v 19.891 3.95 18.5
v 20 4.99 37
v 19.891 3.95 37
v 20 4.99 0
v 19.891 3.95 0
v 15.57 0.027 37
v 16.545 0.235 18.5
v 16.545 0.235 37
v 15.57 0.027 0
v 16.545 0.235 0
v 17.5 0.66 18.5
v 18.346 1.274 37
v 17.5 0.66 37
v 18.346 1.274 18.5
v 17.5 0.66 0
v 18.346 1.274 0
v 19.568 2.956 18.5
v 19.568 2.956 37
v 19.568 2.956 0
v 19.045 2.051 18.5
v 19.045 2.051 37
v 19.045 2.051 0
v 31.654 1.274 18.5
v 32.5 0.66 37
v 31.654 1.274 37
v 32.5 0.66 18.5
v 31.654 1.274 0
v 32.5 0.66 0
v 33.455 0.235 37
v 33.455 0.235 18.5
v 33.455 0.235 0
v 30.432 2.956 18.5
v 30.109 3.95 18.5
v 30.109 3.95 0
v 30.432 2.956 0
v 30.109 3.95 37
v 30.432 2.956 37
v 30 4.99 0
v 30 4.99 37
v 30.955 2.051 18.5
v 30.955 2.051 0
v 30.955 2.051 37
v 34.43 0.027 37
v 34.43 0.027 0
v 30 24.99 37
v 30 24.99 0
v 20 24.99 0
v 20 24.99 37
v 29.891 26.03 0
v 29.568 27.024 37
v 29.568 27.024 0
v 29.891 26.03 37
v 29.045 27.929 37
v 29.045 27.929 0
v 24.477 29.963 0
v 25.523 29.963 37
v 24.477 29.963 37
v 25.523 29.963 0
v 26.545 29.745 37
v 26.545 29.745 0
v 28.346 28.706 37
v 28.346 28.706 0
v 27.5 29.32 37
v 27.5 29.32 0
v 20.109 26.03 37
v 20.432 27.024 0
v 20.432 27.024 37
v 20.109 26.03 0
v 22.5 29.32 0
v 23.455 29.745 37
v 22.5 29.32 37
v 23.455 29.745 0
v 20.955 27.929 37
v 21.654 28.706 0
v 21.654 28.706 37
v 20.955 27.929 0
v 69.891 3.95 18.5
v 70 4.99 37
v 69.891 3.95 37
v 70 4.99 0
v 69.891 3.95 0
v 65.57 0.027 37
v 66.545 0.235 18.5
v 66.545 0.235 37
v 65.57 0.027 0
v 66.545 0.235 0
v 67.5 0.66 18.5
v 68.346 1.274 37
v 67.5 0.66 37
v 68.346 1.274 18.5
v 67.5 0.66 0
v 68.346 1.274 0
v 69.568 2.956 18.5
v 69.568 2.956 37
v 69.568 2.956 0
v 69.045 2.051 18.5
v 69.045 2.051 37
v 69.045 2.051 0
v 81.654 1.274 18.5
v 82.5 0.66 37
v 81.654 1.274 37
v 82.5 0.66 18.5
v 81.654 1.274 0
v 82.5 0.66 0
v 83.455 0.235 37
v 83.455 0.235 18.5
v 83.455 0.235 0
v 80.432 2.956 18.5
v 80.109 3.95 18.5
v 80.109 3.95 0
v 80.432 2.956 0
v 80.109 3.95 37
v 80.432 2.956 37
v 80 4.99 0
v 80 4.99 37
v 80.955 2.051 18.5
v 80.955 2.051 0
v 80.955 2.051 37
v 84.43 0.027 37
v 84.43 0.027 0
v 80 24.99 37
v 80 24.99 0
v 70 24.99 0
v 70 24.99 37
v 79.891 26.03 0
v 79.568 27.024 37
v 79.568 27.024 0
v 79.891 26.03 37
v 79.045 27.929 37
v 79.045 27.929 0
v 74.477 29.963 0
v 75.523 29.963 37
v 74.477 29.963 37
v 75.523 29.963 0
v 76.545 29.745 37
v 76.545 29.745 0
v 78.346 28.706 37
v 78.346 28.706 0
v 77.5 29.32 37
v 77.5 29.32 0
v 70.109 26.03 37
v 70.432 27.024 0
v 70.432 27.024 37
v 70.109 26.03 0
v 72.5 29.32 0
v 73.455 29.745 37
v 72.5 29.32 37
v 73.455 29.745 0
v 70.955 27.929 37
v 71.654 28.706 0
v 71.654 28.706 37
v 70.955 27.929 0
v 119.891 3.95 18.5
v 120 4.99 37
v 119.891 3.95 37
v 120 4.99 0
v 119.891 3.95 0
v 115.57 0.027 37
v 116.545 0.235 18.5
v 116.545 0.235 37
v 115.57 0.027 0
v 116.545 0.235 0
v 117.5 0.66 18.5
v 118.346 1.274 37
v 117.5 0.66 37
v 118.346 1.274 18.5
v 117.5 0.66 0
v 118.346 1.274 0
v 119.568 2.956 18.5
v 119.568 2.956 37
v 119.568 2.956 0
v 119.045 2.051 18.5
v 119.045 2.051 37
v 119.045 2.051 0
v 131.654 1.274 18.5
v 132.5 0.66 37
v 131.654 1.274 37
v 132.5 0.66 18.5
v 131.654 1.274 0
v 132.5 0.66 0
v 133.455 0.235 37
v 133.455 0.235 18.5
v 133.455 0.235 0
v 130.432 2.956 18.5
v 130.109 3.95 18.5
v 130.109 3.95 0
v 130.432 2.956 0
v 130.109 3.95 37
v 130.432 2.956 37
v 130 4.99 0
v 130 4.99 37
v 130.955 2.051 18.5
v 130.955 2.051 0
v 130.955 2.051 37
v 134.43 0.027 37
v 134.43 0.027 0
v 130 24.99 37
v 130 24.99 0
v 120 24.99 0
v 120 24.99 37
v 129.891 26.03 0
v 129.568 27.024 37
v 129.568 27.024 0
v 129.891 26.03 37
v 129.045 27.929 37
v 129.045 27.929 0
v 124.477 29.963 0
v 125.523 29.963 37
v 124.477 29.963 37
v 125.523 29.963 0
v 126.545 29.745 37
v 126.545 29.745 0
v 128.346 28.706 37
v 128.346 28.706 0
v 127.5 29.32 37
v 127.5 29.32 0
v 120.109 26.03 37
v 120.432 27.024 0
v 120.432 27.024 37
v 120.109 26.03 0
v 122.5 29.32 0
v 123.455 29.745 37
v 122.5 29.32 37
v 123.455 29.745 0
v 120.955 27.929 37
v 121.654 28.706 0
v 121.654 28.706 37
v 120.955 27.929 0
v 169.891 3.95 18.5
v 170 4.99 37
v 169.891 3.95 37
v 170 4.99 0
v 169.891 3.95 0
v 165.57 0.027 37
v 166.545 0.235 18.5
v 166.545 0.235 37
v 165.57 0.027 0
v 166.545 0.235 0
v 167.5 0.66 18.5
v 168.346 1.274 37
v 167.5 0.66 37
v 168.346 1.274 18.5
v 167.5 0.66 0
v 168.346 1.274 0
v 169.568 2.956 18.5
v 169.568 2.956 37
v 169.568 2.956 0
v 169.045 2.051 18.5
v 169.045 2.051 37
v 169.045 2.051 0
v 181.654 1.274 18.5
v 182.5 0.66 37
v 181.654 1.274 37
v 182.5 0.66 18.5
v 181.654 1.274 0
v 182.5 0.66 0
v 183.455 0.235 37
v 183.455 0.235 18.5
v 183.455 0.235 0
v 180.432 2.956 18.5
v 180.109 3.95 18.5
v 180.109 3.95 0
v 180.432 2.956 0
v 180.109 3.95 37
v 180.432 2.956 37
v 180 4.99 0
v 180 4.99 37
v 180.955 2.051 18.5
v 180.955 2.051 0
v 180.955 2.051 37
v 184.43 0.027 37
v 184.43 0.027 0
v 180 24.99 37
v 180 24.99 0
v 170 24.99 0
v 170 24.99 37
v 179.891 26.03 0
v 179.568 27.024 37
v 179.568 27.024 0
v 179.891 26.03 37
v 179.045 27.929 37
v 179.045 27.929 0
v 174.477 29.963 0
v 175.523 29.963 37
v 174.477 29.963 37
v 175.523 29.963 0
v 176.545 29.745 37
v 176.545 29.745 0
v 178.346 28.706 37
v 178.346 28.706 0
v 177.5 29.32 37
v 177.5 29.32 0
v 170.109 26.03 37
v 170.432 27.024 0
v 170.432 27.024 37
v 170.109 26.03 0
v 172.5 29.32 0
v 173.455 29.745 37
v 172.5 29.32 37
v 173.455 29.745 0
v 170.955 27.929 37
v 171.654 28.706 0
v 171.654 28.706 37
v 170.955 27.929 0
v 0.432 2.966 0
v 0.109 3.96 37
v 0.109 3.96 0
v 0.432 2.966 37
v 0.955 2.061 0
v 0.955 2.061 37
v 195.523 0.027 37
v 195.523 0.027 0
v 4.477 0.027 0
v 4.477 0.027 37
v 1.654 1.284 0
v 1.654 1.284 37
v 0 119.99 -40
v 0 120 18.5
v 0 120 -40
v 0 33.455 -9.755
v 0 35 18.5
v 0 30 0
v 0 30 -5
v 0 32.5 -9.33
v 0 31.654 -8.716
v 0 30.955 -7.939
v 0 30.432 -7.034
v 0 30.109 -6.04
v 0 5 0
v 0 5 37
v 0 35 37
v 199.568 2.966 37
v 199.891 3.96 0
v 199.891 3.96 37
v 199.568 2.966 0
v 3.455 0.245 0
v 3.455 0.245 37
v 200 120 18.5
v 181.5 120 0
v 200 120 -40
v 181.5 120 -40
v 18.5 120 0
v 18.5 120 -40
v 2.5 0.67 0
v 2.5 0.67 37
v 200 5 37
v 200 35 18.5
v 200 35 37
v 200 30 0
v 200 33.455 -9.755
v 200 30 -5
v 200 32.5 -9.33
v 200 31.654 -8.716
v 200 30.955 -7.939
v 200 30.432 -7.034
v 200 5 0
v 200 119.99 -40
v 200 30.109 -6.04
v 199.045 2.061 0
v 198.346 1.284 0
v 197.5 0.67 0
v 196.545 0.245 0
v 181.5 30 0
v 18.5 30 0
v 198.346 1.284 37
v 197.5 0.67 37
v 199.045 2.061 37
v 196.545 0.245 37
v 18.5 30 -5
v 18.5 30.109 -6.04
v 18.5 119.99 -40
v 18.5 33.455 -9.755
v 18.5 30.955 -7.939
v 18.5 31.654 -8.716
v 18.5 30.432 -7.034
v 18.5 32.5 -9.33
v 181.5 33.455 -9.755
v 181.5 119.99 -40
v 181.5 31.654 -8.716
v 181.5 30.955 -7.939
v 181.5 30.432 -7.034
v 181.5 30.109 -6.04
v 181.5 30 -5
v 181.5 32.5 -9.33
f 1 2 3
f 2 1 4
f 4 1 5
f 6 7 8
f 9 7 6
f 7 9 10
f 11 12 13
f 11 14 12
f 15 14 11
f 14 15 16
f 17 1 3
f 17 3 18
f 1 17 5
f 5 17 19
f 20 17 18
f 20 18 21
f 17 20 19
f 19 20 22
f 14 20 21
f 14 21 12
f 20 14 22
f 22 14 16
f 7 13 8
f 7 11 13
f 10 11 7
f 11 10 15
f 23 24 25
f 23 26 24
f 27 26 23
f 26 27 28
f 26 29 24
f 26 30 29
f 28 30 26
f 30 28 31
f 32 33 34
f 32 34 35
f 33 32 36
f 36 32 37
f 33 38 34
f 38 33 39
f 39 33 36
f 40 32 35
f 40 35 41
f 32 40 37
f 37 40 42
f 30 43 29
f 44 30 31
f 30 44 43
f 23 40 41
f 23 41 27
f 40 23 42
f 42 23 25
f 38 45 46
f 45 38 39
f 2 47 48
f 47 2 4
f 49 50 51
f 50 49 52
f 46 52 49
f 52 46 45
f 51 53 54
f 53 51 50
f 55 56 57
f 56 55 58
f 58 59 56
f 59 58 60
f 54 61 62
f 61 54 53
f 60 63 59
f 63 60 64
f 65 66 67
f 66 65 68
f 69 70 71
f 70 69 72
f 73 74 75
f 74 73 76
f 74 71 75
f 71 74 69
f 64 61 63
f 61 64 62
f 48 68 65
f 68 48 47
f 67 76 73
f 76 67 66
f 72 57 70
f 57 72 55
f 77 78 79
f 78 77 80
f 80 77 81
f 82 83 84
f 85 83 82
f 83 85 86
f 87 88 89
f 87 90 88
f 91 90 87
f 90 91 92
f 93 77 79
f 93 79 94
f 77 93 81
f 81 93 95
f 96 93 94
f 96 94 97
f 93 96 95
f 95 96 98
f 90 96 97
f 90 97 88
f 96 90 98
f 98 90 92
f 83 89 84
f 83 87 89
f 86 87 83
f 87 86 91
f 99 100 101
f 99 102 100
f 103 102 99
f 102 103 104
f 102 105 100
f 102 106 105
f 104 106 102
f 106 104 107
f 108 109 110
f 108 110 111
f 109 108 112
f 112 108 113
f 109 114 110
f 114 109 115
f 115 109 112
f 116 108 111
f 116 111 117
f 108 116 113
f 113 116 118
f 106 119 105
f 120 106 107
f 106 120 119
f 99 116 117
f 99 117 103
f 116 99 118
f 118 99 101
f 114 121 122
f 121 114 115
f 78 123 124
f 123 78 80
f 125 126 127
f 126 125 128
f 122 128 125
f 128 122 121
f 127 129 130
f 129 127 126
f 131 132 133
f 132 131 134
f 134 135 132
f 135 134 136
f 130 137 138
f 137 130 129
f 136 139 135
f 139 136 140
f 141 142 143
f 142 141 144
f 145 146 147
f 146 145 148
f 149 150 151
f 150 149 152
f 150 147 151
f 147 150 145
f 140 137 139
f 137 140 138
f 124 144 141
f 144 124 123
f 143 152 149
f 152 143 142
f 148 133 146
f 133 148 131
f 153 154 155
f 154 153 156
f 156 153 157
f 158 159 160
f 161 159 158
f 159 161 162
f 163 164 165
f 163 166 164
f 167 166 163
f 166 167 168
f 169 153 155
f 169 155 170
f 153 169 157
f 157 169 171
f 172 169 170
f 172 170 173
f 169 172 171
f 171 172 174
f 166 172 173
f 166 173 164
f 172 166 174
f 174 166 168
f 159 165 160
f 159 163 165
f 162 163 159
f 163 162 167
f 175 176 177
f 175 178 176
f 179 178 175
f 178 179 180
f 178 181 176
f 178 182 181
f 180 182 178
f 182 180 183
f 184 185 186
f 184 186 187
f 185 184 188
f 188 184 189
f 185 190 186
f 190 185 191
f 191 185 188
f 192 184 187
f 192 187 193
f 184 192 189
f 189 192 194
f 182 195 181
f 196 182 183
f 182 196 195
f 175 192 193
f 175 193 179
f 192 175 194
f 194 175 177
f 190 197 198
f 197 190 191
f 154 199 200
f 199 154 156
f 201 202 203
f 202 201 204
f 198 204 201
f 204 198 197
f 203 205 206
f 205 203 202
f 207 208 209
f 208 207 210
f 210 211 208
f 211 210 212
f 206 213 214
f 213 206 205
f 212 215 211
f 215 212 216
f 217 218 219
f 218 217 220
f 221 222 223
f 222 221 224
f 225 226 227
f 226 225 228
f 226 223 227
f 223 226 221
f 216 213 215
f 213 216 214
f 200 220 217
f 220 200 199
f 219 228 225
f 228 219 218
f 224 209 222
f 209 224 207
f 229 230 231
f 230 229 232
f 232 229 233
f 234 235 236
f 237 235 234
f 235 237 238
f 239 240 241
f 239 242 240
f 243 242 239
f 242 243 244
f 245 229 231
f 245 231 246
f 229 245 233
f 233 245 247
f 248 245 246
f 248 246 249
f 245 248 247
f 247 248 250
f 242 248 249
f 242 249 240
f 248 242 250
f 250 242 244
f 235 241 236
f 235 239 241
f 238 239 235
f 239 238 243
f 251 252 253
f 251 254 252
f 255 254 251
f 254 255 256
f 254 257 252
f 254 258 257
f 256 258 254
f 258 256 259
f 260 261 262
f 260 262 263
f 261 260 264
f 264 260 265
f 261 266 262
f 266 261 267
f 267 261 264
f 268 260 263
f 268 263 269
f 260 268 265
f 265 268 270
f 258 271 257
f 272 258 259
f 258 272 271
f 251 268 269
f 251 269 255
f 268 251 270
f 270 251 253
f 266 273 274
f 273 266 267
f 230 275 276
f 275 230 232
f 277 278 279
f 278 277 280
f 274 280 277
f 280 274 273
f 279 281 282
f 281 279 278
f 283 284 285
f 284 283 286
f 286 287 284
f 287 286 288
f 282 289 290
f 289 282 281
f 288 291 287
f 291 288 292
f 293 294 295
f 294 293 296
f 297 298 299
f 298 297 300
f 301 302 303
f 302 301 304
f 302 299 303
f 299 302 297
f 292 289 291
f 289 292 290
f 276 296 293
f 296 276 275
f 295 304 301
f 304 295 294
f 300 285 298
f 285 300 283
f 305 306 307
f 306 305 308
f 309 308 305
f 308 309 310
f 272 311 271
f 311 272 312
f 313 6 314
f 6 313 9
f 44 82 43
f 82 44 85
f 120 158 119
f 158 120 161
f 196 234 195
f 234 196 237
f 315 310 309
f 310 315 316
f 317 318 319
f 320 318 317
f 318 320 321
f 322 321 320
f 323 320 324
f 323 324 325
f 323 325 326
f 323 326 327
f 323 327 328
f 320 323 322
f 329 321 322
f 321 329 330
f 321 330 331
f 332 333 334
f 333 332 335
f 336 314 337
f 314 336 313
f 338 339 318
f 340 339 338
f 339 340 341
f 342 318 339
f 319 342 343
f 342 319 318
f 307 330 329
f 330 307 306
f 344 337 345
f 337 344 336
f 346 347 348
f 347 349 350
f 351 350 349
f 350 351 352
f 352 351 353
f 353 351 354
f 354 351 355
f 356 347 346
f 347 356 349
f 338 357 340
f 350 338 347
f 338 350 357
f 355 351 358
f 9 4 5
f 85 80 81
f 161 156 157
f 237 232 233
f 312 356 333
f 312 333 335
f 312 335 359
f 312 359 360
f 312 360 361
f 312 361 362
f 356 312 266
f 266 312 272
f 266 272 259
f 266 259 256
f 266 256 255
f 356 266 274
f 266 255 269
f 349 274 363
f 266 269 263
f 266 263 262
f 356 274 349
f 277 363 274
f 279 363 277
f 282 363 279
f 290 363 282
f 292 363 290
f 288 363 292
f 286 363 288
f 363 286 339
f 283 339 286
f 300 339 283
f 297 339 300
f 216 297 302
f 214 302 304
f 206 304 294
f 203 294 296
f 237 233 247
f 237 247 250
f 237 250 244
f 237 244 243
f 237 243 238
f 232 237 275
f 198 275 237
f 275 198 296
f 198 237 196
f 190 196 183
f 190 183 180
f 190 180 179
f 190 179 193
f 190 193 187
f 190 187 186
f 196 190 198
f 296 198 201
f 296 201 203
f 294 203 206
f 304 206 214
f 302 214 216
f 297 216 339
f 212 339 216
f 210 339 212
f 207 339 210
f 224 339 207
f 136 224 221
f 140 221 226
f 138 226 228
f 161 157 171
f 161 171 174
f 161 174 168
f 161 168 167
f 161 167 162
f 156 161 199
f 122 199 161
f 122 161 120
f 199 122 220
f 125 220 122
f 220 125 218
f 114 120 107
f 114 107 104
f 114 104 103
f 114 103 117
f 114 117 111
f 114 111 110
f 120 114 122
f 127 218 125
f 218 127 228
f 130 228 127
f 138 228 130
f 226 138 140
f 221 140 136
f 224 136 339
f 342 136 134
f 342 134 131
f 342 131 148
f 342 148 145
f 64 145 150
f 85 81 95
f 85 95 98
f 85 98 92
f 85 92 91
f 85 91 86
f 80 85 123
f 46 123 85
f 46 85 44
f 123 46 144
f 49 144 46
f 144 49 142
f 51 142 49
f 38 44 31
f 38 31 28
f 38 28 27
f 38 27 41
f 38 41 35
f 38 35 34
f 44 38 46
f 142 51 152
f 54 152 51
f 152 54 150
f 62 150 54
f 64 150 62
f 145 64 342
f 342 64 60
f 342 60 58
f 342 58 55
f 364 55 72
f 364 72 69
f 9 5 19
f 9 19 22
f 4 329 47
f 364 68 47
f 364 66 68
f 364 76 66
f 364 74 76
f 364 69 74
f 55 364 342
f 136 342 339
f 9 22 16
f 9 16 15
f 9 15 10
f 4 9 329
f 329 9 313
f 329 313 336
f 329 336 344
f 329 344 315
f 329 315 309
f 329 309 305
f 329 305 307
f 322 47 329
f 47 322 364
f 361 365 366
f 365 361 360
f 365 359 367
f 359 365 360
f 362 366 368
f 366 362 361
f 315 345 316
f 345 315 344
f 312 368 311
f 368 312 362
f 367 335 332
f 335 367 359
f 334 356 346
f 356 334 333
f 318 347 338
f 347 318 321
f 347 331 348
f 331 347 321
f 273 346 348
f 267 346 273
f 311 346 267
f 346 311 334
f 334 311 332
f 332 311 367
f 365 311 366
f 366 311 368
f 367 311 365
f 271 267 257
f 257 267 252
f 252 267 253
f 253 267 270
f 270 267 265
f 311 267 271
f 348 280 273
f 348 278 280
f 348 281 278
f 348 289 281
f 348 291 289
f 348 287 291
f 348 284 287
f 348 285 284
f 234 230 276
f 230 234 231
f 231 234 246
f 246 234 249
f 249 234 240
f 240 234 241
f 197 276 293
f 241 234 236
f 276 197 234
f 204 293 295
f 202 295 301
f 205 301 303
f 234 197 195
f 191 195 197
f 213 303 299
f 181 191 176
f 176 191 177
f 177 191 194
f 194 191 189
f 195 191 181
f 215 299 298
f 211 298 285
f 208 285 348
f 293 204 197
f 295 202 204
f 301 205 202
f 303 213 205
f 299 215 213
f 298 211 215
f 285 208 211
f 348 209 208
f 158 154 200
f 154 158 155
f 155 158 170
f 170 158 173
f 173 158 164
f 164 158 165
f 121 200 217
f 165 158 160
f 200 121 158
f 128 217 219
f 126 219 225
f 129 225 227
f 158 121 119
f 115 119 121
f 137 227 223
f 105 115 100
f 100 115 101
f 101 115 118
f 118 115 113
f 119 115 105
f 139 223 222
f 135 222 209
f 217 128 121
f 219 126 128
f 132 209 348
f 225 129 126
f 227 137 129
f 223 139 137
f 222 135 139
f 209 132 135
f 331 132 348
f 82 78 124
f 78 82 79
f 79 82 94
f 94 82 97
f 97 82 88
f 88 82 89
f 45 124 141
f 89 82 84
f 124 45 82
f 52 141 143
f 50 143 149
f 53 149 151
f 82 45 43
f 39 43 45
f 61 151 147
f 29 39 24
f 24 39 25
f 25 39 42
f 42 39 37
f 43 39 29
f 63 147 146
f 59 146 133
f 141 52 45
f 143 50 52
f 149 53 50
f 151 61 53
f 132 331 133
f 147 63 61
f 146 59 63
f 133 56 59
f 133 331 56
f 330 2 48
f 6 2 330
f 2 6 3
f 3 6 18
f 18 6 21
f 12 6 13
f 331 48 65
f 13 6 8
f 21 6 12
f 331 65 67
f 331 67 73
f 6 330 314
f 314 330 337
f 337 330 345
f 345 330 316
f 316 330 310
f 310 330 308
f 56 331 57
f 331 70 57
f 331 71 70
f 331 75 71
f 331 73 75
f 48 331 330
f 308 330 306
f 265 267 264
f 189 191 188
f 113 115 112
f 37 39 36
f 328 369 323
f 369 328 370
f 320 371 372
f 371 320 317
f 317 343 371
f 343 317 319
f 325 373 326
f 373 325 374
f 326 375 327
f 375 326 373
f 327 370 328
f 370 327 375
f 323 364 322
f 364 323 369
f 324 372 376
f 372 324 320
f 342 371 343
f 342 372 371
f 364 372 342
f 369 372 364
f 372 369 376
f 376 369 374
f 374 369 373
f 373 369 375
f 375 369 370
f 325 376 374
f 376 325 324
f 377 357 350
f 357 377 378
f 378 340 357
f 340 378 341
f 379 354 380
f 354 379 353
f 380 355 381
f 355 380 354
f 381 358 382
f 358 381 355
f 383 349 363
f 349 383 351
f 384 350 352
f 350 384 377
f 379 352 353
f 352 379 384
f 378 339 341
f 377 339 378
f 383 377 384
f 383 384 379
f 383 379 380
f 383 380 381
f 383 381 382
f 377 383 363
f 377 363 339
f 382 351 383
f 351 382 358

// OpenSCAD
// Clamp rack 
// To be cut from 18 mm material

SELECT = "ALL"; // ["ALL", "MAIN", "TOP", "BRACKET"]

QTY_CLAMPS = 4;
SPACING = 50;
DEPTH = 120;
DEPTH2 = 35;
SLOT_WIDTH = 10;
SLOT_DEPTH = 30;
THICKNESS = 18.5; // OSB is a little over 18
ROUNDING = 5;

assert(ROUNDING <= SLOT_WIDTH / 2);

w = QTY_CLAMPS * SPACING;
tiny = 0.01;
$fn=30;

if (SELECT == "ALL") {
  Rack(DEPTH);
  color("green") translate([0,0,THICKNESS]) Rack(DEPTH2);
  color("blue") {
    Bracket(40);
    translate([w-THICKNESS,0,0]) Bracket(40);
  }
} else if (SELECT == "MAIN") {
  Rack(DEPTH);
} else if (SELECT == "BRACKET") {
  Bracket(40);
} else {
  Rack(DEPTH2);
}

module Rack(d) {
  difference() {
    hull() {
      // Back
      translate([0,d-1,0]) cube([w,1,THICKNESS]);
      translate([ROUNDING, ROUNDING, 0]) cylinder(r=ROUNDING,h=THICKNESS);
      translate([w-ROUNDING, ROUNDING, 0]) cylinder(r=ROUNDING,h=THICKNESS);
      
    }
    for(c = [0:QTY_CLAMPS-1]) {
      translate([SPACING/2 + c*SPACING - SLOT_WIDTH/2, -tiny, -tiny]) {
        // sphere(3);
        cube([SLOT_WIDTH, SLOT_DEPTH - SLOT_WIDTH/2, THICKNESS+2*tiny]);
        translate([SLOT_WIDTH/2, SLOT_DEPTH - SLOT_WIDTH/2, 0]) cylinder(d=SLOT_WIDTH, h=THICKNESS+2*tiny);
        difference() {
          translate([-ROUNDING,-ROUNDING,0]) cube([2*ROUNDING,2*ROUNDING,THICKNESS+2*tiny]);
          translate([-ROUNDING,ROUNDING,0]) cylinder(d=SLOT_WIDTH, h=THICKNESS+2*tiny);
        }
        difference() {
          translate([ROUNDING,-ROUNDING,0]) cube([2*ROUNDING,2*ROUNDING,THICKNESS+2*tiny]);
          translate([SLOT_WIDTH+ROUNDING,ROUNDING,0]) cylinder(d=SLOT_WIDTH, h=THICKNESS+2*tiny);
        }
      }
    }
  }
}

module Bracket(h=40) {
  translate([0,DEPTH,0]) rotate([-90,0,-90]) hull() {
    // Top
    cube([DEPTH-SLOT_DEPTH,tiny,THICKNESS]);
    // Back
    cube([tiny, h,THICKNESS]);
    translate([DEPTH-SLOT_DEPTH-ROUNDING,ROUNDING,0]) cylinder(r=ROUNDING,h=THICKNESS);
    // translate([ROUNDING,h-ROUNDING,0]) cylinder(r=ROUNDING,h=THICKNESS);
  }
}
